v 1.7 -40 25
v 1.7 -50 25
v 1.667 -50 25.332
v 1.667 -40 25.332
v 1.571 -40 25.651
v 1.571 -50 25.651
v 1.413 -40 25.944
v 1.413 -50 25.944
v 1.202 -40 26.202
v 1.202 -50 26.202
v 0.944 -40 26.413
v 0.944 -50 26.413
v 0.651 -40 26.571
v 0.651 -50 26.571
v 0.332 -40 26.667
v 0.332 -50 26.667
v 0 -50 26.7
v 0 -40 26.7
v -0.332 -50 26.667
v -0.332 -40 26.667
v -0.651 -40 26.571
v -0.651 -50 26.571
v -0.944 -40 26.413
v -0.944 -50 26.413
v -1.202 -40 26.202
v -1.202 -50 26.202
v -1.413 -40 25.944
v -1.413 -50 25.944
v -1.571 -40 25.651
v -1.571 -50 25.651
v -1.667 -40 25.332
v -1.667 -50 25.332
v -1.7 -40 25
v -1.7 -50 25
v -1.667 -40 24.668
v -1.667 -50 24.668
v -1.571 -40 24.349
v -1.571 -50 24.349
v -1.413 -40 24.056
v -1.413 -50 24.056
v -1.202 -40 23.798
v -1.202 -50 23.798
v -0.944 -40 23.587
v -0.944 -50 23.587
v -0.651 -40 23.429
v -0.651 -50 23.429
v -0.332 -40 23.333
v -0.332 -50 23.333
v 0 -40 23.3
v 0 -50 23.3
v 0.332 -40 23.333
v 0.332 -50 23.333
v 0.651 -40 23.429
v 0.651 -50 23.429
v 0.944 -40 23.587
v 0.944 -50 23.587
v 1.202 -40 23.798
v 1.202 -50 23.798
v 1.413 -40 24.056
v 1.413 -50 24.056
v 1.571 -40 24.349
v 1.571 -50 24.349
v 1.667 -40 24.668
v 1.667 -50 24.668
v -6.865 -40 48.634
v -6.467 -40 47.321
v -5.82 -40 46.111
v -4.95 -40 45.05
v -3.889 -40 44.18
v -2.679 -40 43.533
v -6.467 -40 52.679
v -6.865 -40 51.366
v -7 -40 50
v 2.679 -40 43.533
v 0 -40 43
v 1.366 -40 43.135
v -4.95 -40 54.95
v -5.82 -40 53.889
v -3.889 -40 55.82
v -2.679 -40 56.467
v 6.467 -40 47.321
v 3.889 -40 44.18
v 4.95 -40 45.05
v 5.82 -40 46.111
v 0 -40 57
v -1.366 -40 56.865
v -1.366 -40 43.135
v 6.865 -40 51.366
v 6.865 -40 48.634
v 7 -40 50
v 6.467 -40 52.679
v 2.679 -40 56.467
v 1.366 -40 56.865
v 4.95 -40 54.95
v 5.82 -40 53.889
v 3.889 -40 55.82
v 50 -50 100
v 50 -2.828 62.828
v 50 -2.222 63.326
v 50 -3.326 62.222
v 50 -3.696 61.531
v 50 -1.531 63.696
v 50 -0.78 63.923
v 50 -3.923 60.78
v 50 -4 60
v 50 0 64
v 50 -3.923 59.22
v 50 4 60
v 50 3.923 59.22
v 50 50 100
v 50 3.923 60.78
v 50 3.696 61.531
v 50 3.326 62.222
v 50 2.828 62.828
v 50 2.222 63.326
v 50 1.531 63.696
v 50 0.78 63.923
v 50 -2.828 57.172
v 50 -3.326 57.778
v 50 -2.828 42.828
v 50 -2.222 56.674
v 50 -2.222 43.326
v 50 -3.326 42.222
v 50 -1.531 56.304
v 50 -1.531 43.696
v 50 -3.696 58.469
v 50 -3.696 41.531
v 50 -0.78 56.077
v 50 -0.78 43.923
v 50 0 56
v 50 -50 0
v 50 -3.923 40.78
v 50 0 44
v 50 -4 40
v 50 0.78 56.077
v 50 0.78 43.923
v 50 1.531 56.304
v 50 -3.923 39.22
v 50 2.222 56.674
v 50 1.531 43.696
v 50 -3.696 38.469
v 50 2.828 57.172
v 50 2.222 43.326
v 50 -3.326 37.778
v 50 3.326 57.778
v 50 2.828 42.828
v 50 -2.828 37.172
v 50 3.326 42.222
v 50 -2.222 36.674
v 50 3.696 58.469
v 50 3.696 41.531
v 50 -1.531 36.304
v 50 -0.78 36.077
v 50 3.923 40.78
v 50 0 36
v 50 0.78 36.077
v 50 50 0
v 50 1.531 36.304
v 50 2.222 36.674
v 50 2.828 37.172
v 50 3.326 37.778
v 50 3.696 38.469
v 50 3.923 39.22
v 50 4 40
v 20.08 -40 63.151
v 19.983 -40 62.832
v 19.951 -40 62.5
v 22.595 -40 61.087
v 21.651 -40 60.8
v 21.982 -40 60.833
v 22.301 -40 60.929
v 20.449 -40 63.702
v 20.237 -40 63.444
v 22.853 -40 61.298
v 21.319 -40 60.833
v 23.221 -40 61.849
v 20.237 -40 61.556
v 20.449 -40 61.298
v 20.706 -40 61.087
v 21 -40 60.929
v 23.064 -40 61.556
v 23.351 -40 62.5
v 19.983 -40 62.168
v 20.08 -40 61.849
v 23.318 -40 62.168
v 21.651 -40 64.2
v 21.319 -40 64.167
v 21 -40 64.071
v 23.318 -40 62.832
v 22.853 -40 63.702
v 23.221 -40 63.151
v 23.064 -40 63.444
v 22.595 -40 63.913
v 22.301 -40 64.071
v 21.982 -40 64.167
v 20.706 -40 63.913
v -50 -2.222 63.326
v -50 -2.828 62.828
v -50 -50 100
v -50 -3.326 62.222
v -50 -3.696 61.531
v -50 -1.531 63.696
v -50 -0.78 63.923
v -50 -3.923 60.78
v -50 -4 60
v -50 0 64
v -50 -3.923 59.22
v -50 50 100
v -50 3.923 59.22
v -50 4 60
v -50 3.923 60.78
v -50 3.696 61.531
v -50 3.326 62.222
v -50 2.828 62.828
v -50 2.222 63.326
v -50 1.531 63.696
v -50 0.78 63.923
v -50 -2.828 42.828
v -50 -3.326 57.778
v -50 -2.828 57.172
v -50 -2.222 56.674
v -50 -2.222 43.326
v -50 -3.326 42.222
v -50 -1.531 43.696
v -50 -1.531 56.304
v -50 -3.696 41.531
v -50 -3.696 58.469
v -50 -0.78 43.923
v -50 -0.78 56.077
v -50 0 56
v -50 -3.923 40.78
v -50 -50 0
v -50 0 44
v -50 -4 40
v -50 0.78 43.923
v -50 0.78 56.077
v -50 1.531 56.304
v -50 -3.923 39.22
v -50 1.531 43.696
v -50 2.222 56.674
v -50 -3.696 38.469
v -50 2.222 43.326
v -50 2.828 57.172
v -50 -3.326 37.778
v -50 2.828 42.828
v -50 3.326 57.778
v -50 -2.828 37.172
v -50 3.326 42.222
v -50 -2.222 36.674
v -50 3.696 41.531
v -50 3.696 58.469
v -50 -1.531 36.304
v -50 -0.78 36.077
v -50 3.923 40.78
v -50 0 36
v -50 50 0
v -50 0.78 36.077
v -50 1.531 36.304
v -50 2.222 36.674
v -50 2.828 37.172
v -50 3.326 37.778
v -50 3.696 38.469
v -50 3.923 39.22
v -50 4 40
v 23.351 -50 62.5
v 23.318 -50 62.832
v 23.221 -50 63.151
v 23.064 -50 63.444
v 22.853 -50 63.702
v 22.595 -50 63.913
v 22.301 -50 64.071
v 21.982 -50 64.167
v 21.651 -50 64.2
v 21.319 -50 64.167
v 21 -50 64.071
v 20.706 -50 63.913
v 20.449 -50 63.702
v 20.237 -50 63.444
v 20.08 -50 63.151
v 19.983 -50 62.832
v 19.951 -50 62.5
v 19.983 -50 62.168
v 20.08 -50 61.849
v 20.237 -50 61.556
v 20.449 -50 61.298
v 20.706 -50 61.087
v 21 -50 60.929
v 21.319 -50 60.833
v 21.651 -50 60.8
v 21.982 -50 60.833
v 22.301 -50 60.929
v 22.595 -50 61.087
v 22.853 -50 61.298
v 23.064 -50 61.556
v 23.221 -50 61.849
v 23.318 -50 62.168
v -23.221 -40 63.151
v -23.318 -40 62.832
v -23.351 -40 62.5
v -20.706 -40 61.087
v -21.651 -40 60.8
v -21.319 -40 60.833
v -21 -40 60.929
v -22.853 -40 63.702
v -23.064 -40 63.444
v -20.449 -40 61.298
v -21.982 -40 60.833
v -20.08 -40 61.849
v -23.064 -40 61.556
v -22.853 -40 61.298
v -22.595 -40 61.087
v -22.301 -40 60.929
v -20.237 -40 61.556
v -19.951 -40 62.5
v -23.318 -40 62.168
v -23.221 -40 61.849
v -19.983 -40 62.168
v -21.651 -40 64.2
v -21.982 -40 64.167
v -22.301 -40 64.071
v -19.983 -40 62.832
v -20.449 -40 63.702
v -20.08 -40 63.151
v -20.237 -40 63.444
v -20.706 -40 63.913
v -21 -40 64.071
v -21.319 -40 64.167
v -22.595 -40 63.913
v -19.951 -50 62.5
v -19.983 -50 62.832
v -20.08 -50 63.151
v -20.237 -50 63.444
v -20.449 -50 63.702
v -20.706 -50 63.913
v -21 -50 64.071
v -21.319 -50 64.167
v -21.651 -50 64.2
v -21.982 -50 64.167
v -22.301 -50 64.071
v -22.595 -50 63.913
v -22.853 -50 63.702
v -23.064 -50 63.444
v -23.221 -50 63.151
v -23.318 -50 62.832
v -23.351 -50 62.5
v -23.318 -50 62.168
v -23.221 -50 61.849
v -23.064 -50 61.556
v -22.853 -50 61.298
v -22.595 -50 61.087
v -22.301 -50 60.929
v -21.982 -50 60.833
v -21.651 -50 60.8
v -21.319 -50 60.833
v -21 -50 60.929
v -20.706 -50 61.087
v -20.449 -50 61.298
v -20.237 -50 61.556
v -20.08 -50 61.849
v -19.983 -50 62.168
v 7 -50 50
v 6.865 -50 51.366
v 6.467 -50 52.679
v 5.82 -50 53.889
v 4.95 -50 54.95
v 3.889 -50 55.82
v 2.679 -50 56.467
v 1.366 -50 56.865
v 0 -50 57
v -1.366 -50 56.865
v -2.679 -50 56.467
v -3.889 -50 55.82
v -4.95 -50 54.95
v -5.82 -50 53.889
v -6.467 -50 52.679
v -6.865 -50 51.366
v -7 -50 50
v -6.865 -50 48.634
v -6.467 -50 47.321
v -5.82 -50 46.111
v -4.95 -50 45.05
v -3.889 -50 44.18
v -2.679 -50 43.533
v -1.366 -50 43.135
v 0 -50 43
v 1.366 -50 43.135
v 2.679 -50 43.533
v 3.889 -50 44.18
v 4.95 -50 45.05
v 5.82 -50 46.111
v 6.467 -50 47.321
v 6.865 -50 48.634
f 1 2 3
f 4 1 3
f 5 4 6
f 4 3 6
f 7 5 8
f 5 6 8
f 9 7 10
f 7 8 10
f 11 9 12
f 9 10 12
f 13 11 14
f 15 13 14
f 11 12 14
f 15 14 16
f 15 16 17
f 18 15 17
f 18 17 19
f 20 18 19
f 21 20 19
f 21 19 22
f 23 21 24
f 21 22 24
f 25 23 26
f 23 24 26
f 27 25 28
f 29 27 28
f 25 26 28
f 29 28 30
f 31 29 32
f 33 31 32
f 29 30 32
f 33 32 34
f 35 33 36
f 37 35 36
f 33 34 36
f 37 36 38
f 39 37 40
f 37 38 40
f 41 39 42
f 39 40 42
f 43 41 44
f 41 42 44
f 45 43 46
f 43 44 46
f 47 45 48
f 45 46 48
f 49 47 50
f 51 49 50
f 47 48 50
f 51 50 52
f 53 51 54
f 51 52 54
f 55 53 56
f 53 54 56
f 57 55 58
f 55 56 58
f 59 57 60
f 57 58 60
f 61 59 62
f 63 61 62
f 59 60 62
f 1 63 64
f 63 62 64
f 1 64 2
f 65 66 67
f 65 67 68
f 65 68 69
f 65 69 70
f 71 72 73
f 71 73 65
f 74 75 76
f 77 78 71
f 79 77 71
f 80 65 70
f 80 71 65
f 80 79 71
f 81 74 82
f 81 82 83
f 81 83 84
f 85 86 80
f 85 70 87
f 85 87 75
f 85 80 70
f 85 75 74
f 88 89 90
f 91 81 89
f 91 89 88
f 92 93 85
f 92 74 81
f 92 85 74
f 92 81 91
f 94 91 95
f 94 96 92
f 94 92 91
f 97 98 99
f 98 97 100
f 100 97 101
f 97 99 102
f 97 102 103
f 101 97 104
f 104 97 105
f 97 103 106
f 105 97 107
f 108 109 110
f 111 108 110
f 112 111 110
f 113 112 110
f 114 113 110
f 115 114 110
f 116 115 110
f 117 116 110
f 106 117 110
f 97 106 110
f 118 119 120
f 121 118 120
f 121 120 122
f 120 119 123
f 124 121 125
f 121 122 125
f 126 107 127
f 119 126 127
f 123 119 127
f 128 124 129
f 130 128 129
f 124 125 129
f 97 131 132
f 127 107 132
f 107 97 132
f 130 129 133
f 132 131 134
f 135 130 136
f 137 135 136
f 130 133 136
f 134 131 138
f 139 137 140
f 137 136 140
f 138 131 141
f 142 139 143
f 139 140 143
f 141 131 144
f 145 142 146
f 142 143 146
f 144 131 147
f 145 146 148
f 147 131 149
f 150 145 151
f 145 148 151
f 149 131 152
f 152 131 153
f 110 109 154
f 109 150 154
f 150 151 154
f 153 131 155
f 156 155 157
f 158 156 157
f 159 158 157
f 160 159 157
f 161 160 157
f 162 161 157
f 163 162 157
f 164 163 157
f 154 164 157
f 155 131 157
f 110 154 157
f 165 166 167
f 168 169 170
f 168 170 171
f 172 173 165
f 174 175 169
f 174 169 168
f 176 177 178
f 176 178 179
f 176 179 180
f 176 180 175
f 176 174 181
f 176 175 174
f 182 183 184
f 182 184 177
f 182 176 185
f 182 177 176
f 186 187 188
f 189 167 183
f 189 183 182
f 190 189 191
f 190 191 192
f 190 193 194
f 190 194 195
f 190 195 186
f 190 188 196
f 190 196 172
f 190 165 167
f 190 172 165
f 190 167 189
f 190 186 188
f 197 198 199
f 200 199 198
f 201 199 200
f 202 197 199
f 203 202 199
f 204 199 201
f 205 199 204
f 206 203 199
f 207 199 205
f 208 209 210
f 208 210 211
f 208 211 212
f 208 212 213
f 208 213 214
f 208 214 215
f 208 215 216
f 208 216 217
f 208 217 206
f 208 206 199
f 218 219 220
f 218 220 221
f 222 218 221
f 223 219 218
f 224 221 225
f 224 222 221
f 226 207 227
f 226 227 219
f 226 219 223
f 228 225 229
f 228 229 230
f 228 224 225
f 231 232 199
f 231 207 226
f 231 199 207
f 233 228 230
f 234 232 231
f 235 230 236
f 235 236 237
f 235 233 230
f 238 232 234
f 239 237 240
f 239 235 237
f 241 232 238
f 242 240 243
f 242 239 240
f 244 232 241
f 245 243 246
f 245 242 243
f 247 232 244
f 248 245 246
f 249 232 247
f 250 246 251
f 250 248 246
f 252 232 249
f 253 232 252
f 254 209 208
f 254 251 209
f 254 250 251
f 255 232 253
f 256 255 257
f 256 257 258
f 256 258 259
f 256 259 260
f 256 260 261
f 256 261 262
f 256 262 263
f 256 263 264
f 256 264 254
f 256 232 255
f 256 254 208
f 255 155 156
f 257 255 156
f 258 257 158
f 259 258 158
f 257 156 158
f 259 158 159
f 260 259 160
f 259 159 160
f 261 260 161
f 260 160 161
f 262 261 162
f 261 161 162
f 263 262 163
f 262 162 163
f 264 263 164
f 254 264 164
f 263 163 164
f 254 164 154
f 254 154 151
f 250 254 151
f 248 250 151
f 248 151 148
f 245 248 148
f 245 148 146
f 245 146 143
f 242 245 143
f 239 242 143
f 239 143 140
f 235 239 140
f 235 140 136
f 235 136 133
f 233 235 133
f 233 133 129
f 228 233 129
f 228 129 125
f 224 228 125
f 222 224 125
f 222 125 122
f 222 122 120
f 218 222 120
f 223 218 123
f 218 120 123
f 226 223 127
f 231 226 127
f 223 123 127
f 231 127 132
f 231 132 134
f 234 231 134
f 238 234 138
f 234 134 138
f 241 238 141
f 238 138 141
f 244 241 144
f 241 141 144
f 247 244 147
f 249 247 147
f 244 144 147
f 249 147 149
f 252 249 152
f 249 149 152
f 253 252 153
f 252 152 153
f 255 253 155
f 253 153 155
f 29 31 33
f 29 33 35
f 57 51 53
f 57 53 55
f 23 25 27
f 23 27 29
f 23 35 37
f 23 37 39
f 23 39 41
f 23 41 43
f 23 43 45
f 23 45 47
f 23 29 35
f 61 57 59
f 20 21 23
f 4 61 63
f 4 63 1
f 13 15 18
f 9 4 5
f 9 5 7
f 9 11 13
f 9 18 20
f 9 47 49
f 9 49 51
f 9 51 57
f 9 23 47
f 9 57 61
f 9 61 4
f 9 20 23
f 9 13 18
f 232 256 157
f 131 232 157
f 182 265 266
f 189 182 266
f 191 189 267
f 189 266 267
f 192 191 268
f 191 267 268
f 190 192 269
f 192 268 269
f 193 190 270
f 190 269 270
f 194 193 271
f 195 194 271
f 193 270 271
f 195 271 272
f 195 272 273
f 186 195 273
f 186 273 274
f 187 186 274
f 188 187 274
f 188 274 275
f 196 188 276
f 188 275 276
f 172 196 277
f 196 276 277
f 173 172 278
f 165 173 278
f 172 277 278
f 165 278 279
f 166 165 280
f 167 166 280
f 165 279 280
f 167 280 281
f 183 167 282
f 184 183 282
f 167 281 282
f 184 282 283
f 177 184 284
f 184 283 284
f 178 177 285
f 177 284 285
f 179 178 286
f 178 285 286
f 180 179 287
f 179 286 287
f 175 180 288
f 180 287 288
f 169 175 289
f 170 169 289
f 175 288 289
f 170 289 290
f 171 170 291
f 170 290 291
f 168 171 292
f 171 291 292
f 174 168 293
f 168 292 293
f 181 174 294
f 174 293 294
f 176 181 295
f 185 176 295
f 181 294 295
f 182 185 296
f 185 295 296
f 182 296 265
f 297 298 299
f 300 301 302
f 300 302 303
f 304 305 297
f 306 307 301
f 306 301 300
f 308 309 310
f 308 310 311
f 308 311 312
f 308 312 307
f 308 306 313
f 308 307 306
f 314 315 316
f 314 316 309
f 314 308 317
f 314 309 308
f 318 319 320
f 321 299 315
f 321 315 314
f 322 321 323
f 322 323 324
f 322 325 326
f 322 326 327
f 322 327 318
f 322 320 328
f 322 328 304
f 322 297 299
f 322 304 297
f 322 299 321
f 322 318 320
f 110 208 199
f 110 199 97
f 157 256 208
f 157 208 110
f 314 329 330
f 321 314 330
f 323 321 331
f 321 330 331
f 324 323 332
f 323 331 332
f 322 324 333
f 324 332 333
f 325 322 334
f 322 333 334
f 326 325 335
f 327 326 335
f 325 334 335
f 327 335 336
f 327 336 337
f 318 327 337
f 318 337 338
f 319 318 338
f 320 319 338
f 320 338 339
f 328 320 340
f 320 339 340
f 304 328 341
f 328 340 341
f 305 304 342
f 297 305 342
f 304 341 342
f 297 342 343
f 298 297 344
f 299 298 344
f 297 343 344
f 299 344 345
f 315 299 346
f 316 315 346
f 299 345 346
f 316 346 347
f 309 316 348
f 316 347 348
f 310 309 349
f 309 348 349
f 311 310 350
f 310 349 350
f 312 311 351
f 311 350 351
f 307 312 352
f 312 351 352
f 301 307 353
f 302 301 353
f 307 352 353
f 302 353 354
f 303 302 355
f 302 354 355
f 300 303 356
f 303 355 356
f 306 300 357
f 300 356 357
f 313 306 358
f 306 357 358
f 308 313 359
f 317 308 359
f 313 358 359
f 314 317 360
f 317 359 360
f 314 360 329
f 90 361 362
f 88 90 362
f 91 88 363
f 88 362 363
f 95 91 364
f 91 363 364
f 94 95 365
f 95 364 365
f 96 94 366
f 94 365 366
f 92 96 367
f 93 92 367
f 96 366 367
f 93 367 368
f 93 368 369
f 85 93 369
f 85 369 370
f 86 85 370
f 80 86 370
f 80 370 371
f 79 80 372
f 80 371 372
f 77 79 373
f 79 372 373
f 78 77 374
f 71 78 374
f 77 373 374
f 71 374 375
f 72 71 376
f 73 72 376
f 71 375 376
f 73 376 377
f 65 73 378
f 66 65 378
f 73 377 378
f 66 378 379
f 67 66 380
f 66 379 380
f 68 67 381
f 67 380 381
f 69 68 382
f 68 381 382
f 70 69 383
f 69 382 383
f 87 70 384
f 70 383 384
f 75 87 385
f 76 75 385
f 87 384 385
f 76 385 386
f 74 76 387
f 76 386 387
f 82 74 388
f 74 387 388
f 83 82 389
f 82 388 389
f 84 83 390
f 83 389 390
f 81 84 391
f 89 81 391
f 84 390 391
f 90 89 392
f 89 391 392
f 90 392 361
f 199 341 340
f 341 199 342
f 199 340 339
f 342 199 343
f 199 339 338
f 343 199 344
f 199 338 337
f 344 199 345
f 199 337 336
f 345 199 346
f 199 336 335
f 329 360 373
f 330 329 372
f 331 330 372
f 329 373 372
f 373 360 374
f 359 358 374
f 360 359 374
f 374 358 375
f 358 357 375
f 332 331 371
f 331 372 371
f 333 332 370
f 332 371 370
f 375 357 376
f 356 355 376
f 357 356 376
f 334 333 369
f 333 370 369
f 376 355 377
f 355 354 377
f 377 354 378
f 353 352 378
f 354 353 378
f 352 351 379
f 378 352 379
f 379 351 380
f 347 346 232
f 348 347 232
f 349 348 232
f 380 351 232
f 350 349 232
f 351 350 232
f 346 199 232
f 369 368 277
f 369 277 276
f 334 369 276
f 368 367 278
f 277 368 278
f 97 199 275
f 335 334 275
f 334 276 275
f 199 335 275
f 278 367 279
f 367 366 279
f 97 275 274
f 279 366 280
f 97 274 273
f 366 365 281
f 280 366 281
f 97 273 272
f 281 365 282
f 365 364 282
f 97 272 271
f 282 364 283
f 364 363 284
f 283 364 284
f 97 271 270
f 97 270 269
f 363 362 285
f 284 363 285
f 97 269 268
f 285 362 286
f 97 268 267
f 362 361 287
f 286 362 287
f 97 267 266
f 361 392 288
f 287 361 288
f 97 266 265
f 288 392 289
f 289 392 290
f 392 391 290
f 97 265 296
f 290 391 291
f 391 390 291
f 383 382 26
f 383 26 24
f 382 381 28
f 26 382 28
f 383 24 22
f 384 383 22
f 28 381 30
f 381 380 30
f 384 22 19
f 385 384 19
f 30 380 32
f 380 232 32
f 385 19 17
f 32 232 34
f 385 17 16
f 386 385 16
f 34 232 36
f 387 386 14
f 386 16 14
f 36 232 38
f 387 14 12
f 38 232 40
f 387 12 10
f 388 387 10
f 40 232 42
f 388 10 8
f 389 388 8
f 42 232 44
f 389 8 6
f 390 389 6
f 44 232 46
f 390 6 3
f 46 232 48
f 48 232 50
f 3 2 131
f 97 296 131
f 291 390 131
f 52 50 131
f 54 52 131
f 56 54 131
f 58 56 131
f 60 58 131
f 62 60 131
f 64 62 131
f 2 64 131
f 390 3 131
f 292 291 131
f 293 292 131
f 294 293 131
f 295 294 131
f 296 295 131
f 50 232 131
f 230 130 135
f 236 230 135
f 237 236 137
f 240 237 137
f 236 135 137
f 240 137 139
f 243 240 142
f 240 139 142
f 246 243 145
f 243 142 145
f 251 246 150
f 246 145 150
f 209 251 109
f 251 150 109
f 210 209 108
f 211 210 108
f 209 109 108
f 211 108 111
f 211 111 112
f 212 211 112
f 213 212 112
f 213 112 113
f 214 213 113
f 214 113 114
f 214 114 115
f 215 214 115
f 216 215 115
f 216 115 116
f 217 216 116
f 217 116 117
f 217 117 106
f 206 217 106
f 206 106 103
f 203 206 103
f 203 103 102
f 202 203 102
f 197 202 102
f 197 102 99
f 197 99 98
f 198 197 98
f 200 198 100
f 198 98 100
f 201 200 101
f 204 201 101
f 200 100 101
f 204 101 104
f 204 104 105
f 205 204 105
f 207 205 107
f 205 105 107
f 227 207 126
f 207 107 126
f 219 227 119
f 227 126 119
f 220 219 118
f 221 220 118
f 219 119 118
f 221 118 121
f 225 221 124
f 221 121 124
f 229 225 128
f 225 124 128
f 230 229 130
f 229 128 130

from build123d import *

# Parameters (mm, degrees)
ESBO_O1_W                = 100
ESBO_O1_H                = 100
RESSALTO_EXTRUS_O1_DEPTH = 100
CORTE_EXTRUS_O1_REACH    = 152
ESBO_O2_R                = 4
ESBO_O3_R                = 7
ESBO_O3_R_2              = 1.7
CORTE_EXTRUS_O2_DEPTH    = 10


with BuildPart() as part:
    # Esboço1 → Ressalto-extrusão1 (new body)
    with BuildSketch(Plane.XY):
        Rectangle(ESBO_O1_W, ESBO_O1_H)
    extrude(amount=RESSALTO_EXTRUS_O1_DEPTH)

    # Esboço2 → Corte-extrusão1 (cut, up to next)
    with BuildSketch(Plane(origin=(50, 0, 0), x_dir=(0, 0, -1), z_dir=(1, 0, 0)), mode=Mode.PRIVATE) as corte_extrus_o1_sk1:
        with Locations((-40, 0)):
            Circle(ESBO_O2_R)
    corte_extrus_o1_tool1 = extrude(corte_extrus_o1_sk1.sketch, amount=-CORTE_EXTRUS_O1_REACH, mode=Mode.PRIVATE) & part.part
    # Esboço2 → Corte-extrusão1 (cut, up to next)
    with BuildSketch(Plane(origin=(50, 0, 0), x_dir=(0, 0, -1), z_dir=(1, 0, 0)), mode=Mode.PRIVATE) as corte_extrus_o1_sk2:
        with Locations((-60, 0)):
            Circle(ESBO_O2_R)
    corte_extrus_o1_tool2 = extrude(corte_extrus_o1_sk2.sketch, amount=-CORTE_EXTRUS_O1_REACH, mode=Mode.PRIVATE) & part.part
    add(corte_extrus_o1_tool1.solids().sort_by_distance((50, 0, 40))[0], mode=Mode.SUBTRACT)
    add(corte_extrus_o1_tool2.solids().sort_by_distance((50, 0, 60))[0], mode=Mode.SUBTRACT)

    # Esboço3 → Corte-extrusão2 (cut)
    with BuildSketch(Plane(origin=(0, -50, 0), x_dir=(-1, 0, 0), z_dir=(0, -1, 0))):
        with Locations(Location((0, -50, 0), (0, 0, 180))):
            Circle(ESBO_O3_R)
        with Locations(Location((0, -25, 0), (0, 0, 180))):
            Circle(ESBO_O3_R_2)
        with Locations(Location((21.650635095, -62.5, 0), (0, 0, 180))):
            Circle(ESBO_O3_R_2)
        with Locations(Location((-21.650635095, -62.5, 0), (0, 0, 180))):
            Circle(ESBO_O3_R_2)
    extrude(amount=-CORTE_EXTRUS_O2_DEPTH, mode=Mode.SUBTRACT)


solid = part.part
